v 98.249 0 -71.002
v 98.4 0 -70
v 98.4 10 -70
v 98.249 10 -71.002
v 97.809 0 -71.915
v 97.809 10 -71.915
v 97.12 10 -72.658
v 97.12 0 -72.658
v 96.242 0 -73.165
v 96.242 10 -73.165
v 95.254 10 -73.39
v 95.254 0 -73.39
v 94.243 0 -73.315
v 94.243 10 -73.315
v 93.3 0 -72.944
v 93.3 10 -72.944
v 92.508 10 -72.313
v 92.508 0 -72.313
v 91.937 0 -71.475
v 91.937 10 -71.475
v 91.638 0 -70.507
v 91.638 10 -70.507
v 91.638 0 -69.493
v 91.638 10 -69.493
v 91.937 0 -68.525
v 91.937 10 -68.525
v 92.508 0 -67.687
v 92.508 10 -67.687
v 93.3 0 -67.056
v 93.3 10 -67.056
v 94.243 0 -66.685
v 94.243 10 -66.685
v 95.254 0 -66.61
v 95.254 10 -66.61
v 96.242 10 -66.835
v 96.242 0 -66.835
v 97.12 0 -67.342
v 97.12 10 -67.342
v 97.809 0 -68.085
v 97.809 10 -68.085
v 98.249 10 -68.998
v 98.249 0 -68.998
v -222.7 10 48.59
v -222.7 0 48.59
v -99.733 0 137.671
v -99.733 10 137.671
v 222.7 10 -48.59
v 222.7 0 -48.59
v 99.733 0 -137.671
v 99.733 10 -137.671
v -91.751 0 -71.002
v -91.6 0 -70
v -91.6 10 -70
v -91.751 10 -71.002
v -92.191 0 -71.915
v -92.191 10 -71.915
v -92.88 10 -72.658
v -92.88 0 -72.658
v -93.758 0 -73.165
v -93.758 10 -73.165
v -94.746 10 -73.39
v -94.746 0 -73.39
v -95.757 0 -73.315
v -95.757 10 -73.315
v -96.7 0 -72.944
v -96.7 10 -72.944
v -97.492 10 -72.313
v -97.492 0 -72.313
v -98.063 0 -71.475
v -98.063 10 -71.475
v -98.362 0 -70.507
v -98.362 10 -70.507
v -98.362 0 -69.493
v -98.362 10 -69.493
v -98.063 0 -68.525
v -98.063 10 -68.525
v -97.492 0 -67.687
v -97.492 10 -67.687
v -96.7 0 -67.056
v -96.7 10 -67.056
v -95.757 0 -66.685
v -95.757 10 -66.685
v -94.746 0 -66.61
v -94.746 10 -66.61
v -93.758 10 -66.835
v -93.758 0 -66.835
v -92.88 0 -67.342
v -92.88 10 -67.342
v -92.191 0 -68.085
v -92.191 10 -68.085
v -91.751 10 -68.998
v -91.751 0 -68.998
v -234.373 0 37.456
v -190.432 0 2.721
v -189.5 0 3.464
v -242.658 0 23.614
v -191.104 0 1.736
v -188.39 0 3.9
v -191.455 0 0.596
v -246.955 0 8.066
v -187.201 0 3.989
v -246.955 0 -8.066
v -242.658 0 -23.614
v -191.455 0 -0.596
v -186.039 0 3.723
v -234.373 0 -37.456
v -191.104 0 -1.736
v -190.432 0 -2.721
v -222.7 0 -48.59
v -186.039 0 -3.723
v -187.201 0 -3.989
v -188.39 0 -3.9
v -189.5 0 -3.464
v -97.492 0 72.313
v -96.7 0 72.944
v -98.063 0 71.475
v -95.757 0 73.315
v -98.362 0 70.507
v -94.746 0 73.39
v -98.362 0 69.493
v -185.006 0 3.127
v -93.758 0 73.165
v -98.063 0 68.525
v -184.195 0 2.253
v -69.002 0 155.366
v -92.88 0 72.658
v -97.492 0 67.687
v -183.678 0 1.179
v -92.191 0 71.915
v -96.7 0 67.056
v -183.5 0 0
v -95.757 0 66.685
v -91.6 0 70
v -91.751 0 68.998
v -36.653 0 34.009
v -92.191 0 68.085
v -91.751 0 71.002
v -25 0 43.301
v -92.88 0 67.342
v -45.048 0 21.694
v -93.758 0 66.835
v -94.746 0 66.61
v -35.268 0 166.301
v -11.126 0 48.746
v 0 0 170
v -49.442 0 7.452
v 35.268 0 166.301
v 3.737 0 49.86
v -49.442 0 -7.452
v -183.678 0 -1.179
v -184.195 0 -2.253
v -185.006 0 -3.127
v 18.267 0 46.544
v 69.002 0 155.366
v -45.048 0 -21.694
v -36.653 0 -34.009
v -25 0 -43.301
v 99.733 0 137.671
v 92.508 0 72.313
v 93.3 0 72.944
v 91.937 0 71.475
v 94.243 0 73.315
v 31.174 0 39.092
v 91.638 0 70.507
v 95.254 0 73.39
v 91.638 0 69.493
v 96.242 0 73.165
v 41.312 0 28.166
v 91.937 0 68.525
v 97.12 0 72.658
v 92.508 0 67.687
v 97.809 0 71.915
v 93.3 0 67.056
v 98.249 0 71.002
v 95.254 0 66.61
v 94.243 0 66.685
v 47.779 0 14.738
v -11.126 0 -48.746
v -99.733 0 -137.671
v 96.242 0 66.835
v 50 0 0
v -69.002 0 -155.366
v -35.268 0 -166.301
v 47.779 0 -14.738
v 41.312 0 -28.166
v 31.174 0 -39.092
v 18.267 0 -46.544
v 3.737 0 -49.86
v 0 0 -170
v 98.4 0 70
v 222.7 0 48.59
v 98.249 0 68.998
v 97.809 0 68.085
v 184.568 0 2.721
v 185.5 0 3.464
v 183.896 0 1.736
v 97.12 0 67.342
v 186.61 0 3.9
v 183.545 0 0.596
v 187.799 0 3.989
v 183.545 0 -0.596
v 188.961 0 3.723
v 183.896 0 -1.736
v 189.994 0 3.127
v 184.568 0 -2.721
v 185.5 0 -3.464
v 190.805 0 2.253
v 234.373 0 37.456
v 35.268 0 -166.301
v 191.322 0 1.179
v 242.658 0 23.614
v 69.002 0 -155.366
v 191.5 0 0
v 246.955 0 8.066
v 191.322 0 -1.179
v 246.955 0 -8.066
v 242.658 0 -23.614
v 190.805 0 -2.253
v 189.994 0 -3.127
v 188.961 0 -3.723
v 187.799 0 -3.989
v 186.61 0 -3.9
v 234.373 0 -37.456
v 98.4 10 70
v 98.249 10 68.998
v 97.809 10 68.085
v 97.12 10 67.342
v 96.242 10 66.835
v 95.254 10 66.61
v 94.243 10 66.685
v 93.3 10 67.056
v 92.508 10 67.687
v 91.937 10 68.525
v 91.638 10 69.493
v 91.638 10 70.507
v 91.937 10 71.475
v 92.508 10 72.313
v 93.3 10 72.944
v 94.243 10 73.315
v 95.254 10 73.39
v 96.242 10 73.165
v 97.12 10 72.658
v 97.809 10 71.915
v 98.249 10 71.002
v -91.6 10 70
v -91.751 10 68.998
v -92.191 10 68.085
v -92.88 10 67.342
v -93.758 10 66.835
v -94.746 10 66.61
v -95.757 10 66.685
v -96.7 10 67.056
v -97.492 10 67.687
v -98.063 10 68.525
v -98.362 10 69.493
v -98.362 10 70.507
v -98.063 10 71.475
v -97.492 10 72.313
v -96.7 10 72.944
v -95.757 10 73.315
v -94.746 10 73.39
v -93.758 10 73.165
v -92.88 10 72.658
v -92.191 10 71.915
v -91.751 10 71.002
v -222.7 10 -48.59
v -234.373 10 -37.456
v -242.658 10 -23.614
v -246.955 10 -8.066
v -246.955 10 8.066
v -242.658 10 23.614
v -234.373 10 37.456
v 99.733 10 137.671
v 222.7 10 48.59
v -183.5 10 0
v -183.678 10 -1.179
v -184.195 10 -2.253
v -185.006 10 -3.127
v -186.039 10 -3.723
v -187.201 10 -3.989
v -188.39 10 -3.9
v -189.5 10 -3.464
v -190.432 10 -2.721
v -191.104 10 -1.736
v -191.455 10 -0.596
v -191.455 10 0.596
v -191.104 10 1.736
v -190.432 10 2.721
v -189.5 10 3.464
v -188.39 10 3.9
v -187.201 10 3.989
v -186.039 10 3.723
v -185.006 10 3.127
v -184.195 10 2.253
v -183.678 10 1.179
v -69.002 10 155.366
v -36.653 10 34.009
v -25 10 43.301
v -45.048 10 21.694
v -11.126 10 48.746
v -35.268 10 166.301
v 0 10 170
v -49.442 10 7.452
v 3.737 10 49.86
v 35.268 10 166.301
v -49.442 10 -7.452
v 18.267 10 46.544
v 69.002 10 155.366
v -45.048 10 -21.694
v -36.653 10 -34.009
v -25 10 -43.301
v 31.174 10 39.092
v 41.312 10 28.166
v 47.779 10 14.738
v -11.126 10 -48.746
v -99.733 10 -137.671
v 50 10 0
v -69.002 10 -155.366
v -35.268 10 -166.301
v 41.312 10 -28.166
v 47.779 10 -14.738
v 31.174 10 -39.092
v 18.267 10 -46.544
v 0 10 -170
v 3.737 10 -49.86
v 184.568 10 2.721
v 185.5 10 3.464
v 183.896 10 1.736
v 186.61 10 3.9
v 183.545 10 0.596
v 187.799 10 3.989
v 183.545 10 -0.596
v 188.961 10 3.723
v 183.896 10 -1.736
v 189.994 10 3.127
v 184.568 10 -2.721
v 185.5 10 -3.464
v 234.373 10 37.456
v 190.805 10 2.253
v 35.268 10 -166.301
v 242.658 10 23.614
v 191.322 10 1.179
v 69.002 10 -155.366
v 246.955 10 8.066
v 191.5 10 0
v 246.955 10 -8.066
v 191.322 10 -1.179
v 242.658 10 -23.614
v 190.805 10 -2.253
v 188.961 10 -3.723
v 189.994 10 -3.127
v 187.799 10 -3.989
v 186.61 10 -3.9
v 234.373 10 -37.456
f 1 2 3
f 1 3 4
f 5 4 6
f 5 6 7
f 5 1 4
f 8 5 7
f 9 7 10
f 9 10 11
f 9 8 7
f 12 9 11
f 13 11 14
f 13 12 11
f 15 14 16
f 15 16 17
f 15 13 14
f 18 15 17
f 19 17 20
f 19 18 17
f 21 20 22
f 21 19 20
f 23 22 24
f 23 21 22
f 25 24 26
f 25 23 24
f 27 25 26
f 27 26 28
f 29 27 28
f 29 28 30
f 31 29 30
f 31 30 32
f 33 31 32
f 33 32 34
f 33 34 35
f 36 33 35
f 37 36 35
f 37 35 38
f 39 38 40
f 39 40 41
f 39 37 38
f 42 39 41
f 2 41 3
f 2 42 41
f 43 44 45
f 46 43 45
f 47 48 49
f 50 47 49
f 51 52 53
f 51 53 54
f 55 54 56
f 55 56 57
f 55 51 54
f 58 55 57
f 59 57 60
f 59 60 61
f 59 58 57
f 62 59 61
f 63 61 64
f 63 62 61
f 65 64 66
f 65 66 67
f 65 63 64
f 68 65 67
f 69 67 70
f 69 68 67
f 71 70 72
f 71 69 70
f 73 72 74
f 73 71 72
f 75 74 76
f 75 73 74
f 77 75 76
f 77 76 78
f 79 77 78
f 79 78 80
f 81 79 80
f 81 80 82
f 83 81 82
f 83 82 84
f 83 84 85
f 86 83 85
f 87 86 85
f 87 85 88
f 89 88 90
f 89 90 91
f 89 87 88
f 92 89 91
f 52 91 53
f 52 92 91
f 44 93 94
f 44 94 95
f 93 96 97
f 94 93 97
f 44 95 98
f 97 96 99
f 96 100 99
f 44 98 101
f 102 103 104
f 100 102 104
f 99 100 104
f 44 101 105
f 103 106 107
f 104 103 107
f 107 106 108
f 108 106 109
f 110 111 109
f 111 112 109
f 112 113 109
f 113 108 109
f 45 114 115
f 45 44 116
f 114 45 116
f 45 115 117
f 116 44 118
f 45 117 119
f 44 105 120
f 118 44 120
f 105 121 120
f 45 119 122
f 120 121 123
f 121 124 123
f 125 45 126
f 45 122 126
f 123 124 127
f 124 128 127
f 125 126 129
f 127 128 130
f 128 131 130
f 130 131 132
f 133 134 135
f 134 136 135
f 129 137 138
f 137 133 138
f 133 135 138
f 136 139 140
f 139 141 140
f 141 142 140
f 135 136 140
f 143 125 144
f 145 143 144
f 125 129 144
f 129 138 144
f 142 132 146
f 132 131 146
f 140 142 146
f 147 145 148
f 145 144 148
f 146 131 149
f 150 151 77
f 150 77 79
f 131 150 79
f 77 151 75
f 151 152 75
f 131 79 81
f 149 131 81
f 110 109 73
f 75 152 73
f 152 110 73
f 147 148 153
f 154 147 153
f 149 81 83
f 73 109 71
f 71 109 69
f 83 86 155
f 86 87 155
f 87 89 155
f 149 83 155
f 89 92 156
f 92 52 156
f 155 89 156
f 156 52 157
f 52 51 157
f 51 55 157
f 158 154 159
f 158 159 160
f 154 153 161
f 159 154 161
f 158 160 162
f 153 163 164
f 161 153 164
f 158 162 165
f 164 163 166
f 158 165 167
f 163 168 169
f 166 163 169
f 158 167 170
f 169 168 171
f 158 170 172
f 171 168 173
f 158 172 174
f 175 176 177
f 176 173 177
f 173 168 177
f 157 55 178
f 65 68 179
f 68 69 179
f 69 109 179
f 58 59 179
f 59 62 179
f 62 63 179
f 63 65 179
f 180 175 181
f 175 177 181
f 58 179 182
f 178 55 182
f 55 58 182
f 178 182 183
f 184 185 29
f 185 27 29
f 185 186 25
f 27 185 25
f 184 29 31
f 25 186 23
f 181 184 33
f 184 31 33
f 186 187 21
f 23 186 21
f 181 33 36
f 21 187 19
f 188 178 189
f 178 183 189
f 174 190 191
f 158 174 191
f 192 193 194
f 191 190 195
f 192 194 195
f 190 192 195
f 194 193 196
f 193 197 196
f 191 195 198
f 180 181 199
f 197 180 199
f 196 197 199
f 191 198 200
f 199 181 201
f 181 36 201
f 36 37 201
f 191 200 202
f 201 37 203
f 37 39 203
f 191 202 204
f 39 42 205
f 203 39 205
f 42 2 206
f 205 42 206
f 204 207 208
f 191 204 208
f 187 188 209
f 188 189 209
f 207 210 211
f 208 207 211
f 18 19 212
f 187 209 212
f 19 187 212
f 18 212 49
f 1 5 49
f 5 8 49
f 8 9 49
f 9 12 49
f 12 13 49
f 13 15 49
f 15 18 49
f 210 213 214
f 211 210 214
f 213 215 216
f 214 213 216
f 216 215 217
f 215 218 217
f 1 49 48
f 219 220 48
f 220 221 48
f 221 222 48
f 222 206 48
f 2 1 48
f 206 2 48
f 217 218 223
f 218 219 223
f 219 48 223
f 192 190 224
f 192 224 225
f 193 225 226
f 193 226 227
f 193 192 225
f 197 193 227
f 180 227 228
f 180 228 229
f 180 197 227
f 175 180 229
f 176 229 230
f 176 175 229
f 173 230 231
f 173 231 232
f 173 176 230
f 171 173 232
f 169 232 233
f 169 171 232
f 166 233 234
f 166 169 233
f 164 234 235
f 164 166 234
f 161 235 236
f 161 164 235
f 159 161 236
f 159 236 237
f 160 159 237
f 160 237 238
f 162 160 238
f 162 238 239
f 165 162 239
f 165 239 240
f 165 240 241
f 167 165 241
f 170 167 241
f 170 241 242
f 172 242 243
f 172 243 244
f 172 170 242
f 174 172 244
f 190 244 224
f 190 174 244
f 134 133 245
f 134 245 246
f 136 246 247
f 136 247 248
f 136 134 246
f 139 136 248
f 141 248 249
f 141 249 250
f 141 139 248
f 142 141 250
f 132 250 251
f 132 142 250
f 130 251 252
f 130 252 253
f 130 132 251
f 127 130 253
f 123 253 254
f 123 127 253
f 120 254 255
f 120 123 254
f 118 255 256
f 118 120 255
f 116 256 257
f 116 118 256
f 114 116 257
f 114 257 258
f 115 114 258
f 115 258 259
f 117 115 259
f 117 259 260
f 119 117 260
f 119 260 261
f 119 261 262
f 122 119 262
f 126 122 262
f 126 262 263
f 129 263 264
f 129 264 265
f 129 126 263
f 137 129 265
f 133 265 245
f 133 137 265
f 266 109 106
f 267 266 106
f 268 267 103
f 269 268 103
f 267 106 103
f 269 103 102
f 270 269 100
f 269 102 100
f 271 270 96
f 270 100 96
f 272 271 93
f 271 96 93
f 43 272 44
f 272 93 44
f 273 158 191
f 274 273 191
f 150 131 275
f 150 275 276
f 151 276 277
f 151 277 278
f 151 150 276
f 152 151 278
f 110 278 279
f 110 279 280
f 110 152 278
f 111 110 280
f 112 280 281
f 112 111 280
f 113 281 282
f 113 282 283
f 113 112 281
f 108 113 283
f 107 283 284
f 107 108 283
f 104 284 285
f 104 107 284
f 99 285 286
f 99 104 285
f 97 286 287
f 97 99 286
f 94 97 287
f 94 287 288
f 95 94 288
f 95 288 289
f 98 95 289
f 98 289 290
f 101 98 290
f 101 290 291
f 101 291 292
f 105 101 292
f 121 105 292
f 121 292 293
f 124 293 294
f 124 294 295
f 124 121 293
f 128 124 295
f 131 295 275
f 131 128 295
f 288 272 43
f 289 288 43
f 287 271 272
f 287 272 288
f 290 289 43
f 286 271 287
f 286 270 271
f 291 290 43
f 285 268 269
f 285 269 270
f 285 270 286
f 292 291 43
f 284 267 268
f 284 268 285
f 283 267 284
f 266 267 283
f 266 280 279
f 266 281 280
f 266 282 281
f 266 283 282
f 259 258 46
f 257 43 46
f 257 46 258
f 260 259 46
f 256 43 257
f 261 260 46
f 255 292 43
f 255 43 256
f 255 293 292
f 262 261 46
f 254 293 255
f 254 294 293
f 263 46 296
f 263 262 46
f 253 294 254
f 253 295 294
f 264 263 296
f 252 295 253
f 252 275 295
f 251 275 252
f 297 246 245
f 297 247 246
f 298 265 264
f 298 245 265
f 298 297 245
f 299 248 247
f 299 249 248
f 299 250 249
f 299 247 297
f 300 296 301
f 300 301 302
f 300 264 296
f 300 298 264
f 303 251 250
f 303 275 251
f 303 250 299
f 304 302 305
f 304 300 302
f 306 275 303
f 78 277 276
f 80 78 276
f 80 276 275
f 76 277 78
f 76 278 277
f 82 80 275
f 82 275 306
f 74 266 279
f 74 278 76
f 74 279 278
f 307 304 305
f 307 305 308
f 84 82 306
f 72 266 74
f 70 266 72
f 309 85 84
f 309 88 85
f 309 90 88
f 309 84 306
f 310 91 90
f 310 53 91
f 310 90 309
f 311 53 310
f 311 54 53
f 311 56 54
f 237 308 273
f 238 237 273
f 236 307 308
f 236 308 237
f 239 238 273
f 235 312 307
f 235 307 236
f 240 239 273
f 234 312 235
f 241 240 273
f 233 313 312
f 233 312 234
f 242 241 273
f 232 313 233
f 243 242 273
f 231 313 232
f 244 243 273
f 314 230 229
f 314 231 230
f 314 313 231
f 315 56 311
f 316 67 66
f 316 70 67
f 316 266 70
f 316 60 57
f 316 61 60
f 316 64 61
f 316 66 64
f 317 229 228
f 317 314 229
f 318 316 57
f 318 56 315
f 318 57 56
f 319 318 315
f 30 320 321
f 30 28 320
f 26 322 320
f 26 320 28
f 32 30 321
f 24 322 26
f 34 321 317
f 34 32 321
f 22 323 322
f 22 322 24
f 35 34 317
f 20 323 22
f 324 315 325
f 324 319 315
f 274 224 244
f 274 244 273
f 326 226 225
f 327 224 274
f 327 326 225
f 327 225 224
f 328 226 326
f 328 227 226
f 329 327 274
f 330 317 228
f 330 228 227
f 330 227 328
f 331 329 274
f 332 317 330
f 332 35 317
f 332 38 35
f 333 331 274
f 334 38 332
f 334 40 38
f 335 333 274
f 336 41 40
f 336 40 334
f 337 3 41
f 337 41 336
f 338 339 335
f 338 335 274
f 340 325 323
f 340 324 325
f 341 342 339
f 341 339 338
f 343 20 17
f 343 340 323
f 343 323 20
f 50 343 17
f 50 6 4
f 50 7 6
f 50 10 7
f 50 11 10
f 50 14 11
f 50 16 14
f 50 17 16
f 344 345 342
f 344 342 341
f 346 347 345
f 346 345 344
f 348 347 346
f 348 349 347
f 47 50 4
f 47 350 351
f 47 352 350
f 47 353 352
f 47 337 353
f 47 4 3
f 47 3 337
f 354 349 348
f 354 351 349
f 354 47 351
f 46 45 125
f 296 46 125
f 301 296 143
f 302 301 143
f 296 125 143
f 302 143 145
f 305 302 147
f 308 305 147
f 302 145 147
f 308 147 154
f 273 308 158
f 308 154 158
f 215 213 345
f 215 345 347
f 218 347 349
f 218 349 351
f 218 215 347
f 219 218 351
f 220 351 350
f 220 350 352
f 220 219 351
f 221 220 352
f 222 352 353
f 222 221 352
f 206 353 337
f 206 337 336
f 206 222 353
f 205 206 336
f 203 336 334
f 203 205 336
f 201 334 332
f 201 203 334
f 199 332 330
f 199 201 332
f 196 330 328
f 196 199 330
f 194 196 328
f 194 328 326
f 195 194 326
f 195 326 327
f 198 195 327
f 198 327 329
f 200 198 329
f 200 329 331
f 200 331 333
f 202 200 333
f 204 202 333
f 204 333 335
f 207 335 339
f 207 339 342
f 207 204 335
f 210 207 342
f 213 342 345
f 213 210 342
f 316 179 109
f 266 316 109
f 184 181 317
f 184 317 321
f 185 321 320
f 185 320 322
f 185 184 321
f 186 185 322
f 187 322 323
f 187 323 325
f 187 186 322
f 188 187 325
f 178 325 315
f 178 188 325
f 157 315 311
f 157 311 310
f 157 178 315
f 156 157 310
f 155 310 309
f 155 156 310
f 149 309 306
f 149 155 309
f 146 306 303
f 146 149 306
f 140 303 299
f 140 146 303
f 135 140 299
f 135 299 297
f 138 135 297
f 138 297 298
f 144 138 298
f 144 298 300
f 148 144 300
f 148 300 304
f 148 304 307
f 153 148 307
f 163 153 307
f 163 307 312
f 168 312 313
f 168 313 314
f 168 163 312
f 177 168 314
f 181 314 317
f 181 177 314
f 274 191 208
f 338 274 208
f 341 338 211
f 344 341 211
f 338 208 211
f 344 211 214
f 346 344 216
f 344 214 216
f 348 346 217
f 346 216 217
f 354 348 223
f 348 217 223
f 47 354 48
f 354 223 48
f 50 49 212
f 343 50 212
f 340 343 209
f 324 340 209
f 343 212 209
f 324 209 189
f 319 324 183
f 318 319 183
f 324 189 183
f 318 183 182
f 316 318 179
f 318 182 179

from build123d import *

# Parameters (mm, degrees)
CROQUIS1_R              = 50
CROQUIS1_R_2            = 3.4
CROQUIS1_R_3            = 4
SALIENTE_EXTRUIR1_DEPTH = 10


with BuildPart() as part:
    # Croquis1 → Saliente-Extruir1 (new body)
    with BuildSketch(Plane(origin=(0, 0, 0), x_dir=(1, 0, 0), z_dir=(0, 1, 0))):
        with BuildLine():
            Line((-99.733333333, 137.670847394), (-222.7, 48.589710845))
            ThreePointArc((-222.7, 48.589710845), (-247.5, 0), (-222.7, -48.589710845))
            Line((-222.7, -48.589710845), (-99.733333333, -137.670847394))
            ThreePointArc((-99.733333333, -137.670847394), (0, -170), (99.733333333, -137.670847394))
            Line((99.733333333, -137.670847394), (222.7, -48.589710845))
            ThreePointArc((222.7, -48.589710845), (247.5, 0), (222.7, 48.589710845))
            Line((222.7, 48.589710845), (99.733333333, 137.670847394))
            ThreePointArc((99.733333333, 137.670847394), (0, 170), (-99.733333333, 137.670847394))
        make_face()
        Circle(CROQUIS1_R, mode=Mode.SUBTRACT)
        with Locations((-95, 70)):
            Circle(CROQUIS1_R_2, mode=Mode.SUBTRACT)
        with Locations((95, 70)):
            Circle(CROQUIS1_R_2, mode=Mode.SUBTRACT)
        with Locations((95, -70)):
            Circle(CROQUIS1_R_2, mode=Mode.SUBTRACT)
        with Locations((-95, -70)):
            Circle(CROQUIS1_R_2, mode=Mode.SUBTRACT)
        with Locations((187.5, 0)):
            Circle(CROQUIS1_R_3, mode=Mode.SUBTRACT)
        with Locations((-187.5, 0)):
            Circle(CROQUIS1_R_3, mode=Mode.SUBTRACT)
    extrude(amount=SALIENTE_EXTRUIR1_DEPTH)


solid = part.part
